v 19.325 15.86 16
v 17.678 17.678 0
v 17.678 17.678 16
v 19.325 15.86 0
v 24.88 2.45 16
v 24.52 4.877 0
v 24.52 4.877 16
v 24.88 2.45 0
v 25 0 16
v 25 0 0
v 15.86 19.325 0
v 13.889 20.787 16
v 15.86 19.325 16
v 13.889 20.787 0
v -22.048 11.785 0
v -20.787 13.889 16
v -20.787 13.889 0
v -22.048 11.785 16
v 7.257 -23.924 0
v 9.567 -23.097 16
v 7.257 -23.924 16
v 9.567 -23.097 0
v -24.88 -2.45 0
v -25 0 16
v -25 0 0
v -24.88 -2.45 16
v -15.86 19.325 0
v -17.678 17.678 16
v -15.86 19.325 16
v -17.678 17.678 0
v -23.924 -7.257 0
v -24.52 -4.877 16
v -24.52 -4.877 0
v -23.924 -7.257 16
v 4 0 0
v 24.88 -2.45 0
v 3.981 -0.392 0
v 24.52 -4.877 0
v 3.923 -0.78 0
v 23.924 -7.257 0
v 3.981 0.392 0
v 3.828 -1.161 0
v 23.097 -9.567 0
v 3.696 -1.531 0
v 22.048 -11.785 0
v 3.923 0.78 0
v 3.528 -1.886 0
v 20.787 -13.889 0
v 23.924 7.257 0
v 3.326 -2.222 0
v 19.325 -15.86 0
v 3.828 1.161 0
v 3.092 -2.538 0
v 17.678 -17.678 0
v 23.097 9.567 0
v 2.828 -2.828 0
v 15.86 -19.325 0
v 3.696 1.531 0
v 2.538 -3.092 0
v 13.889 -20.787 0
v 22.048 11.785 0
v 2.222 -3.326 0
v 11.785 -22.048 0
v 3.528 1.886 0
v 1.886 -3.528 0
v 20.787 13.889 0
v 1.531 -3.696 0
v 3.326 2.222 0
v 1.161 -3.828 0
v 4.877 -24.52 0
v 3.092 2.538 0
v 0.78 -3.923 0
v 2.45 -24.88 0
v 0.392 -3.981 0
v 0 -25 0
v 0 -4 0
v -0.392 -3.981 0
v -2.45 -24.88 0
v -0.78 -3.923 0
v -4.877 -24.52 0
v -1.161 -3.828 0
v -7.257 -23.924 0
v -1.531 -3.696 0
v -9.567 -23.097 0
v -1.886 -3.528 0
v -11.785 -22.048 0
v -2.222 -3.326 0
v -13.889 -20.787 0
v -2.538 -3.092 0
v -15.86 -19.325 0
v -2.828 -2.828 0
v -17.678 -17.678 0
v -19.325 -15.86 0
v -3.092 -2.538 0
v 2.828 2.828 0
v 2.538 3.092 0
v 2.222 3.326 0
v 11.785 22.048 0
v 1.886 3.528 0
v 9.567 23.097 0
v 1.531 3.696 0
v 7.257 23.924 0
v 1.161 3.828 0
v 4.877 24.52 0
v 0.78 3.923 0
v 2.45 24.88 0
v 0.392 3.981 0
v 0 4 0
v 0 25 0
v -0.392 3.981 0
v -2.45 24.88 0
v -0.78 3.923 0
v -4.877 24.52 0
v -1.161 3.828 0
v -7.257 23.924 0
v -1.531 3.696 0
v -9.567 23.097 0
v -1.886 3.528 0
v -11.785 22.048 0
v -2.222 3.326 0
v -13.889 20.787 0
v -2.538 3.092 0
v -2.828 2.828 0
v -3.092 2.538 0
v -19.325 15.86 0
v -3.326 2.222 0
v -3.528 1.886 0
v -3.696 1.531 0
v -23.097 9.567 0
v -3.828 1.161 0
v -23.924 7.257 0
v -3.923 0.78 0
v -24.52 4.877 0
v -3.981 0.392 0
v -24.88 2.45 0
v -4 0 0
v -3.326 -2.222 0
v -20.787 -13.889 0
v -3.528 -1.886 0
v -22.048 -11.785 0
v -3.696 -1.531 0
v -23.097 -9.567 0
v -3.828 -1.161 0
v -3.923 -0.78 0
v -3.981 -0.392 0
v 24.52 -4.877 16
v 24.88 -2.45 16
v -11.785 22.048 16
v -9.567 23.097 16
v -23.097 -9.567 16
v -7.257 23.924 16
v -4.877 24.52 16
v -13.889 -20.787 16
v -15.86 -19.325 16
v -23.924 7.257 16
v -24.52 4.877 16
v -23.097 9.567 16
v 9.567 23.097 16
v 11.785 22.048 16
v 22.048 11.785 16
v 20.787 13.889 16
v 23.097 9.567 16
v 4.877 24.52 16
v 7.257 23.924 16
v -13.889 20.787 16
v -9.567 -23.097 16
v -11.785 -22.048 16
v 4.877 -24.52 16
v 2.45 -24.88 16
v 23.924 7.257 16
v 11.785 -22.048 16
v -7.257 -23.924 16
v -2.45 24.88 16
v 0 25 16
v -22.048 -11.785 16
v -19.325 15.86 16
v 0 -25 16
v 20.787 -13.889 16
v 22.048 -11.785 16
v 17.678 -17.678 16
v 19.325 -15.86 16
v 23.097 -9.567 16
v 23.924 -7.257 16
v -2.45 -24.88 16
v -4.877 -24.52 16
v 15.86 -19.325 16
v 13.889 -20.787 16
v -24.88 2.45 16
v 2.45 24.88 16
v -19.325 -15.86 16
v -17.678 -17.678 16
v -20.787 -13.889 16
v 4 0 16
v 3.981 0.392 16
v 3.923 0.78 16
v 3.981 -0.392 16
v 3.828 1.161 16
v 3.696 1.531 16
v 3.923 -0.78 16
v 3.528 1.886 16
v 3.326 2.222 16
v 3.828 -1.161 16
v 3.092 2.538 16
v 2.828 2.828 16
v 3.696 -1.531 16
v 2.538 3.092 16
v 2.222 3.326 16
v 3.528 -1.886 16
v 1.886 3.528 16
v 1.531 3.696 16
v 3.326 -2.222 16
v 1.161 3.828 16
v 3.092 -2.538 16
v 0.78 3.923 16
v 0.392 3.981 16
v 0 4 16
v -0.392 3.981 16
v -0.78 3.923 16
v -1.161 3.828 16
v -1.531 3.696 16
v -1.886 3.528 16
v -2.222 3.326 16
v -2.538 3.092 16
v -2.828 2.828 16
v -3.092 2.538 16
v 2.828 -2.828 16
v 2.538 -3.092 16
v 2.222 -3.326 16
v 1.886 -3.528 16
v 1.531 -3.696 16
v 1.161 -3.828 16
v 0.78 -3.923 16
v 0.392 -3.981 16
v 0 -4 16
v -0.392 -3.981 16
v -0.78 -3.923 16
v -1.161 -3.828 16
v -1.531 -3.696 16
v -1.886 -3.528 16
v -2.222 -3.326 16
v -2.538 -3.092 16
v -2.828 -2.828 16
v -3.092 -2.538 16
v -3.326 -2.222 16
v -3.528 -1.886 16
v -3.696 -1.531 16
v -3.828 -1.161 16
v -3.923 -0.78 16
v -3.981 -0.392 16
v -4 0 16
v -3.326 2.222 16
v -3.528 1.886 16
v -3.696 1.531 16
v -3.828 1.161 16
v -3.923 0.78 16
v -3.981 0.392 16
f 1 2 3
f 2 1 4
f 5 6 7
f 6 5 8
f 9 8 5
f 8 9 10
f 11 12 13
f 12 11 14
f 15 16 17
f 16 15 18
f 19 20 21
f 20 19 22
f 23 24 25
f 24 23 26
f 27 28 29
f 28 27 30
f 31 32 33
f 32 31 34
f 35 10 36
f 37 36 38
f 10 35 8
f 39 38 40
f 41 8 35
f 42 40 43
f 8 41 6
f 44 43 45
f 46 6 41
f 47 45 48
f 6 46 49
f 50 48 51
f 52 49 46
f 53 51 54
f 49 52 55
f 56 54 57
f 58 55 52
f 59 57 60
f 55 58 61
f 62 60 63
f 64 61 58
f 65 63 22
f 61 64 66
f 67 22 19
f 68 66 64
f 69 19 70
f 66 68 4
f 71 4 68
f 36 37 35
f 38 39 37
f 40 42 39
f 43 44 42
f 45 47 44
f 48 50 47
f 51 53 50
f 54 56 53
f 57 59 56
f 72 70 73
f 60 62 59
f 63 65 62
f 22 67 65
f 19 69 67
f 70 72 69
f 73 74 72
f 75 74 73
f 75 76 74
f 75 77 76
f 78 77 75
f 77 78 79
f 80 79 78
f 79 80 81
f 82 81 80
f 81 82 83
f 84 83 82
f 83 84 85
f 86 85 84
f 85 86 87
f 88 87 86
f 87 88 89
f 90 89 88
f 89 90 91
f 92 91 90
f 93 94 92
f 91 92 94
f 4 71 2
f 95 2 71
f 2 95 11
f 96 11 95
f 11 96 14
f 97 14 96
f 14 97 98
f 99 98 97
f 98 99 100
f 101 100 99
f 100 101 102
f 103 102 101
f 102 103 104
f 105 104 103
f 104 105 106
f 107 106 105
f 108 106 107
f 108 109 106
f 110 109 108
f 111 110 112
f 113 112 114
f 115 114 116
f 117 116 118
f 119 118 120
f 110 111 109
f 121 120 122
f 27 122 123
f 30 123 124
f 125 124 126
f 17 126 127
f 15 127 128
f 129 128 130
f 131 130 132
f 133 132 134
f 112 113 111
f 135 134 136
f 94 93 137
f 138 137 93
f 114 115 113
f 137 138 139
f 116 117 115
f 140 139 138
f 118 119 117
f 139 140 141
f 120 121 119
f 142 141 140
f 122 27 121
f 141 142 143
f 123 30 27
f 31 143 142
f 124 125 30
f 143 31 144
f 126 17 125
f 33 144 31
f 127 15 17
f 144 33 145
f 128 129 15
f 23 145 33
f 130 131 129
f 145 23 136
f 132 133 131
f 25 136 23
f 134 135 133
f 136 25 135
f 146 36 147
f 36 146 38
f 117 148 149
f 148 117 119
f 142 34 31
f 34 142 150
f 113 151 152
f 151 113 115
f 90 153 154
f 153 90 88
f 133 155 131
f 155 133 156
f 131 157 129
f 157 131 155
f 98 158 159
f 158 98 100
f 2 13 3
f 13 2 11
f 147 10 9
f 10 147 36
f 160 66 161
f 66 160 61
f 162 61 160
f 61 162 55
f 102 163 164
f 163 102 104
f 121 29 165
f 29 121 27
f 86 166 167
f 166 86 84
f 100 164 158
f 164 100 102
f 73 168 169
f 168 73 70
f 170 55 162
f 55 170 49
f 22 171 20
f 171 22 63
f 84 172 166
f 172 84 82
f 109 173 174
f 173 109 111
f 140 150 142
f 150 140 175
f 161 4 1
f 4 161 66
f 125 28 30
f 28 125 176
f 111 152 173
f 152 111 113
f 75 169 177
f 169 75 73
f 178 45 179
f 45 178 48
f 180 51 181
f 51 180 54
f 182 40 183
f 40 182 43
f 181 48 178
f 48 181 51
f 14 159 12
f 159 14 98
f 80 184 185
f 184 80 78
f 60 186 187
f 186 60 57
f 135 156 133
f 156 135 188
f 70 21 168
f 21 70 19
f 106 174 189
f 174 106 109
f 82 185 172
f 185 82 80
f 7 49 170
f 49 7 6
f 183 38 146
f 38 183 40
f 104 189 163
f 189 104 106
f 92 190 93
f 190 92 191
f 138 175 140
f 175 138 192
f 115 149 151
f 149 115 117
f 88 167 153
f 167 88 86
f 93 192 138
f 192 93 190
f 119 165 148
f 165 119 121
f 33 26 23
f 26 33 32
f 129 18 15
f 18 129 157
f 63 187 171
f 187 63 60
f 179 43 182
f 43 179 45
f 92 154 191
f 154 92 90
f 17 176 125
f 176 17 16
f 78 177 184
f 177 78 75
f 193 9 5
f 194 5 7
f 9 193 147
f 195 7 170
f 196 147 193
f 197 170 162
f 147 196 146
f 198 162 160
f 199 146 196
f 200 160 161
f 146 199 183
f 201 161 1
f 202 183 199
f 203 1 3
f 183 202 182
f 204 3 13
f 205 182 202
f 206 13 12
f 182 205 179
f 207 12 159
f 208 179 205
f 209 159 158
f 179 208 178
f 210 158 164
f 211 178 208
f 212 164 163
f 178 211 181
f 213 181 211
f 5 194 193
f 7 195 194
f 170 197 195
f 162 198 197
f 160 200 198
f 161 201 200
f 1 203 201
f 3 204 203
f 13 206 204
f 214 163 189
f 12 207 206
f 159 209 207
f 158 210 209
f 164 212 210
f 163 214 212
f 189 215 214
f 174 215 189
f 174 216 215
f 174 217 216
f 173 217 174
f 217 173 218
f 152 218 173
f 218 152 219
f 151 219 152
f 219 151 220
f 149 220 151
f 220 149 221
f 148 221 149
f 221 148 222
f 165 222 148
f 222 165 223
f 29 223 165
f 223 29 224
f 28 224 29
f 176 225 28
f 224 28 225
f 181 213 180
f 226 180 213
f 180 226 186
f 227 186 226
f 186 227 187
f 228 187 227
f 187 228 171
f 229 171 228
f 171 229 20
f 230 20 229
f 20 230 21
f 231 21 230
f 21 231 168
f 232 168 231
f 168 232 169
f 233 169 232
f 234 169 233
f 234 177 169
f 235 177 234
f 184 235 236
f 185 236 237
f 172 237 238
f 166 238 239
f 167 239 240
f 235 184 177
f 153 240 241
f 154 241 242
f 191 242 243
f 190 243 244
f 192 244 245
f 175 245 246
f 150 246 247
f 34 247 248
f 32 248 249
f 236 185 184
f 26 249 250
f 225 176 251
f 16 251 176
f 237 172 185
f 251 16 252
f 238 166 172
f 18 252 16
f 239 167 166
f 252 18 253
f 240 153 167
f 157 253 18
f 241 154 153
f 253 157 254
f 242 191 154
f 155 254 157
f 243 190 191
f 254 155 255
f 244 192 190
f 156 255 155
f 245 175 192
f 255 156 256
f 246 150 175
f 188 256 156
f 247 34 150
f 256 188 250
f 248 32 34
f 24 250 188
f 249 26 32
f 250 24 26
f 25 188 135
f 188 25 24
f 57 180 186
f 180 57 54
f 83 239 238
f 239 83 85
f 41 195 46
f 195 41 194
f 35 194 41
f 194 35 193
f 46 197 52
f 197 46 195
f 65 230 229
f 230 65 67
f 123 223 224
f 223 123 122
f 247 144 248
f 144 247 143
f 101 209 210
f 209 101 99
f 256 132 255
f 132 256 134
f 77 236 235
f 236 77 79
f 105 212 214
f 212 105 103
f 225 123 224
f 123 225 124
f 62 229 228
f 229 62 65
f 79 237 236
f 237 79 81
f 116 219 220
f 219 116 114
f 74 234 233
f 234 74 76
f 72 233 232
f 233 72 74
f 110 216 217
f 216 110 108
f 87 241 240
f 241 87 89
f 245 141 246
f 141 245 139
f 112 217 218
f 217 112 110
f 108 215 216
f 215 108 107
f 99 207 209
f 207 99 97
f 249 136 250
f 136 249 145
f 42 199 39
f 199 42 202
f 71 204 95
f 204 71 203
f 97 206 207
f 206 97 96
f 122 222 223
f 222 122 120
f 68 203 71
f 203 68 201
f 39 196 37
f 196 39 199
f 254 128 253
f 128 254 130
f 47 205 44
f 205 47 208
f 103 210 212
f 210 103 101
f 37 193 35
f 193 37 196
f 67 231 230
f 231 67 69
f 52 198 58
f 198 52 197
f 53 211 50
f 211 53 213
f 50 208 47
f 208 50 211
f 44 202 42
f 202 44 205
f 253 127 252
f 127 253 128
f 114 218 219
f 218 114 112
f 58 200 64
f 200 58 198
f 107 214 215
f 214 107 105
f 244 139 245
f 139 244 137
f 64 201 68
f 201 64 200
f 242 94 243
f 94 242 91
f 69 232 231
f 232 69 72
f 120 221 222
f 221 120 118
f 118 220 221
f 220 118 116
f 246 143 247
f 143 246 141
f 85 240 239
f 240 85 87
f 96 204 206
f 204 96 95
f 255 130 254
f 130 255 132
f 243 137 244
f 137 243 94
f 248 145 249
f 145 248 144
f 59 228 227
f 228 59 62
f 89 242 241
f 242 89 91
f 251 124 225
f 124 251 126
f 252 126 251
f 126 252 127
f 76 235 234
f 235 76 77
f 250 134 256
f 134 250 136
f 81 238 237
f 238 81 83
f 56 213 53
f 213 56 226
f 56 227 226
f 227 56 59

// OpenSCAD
$fn = 64;
difference() {
  cylinder(h = 16, r = 25);
  translate([0, 0, -1]) cylinder(h = 18, r = 4);
}
